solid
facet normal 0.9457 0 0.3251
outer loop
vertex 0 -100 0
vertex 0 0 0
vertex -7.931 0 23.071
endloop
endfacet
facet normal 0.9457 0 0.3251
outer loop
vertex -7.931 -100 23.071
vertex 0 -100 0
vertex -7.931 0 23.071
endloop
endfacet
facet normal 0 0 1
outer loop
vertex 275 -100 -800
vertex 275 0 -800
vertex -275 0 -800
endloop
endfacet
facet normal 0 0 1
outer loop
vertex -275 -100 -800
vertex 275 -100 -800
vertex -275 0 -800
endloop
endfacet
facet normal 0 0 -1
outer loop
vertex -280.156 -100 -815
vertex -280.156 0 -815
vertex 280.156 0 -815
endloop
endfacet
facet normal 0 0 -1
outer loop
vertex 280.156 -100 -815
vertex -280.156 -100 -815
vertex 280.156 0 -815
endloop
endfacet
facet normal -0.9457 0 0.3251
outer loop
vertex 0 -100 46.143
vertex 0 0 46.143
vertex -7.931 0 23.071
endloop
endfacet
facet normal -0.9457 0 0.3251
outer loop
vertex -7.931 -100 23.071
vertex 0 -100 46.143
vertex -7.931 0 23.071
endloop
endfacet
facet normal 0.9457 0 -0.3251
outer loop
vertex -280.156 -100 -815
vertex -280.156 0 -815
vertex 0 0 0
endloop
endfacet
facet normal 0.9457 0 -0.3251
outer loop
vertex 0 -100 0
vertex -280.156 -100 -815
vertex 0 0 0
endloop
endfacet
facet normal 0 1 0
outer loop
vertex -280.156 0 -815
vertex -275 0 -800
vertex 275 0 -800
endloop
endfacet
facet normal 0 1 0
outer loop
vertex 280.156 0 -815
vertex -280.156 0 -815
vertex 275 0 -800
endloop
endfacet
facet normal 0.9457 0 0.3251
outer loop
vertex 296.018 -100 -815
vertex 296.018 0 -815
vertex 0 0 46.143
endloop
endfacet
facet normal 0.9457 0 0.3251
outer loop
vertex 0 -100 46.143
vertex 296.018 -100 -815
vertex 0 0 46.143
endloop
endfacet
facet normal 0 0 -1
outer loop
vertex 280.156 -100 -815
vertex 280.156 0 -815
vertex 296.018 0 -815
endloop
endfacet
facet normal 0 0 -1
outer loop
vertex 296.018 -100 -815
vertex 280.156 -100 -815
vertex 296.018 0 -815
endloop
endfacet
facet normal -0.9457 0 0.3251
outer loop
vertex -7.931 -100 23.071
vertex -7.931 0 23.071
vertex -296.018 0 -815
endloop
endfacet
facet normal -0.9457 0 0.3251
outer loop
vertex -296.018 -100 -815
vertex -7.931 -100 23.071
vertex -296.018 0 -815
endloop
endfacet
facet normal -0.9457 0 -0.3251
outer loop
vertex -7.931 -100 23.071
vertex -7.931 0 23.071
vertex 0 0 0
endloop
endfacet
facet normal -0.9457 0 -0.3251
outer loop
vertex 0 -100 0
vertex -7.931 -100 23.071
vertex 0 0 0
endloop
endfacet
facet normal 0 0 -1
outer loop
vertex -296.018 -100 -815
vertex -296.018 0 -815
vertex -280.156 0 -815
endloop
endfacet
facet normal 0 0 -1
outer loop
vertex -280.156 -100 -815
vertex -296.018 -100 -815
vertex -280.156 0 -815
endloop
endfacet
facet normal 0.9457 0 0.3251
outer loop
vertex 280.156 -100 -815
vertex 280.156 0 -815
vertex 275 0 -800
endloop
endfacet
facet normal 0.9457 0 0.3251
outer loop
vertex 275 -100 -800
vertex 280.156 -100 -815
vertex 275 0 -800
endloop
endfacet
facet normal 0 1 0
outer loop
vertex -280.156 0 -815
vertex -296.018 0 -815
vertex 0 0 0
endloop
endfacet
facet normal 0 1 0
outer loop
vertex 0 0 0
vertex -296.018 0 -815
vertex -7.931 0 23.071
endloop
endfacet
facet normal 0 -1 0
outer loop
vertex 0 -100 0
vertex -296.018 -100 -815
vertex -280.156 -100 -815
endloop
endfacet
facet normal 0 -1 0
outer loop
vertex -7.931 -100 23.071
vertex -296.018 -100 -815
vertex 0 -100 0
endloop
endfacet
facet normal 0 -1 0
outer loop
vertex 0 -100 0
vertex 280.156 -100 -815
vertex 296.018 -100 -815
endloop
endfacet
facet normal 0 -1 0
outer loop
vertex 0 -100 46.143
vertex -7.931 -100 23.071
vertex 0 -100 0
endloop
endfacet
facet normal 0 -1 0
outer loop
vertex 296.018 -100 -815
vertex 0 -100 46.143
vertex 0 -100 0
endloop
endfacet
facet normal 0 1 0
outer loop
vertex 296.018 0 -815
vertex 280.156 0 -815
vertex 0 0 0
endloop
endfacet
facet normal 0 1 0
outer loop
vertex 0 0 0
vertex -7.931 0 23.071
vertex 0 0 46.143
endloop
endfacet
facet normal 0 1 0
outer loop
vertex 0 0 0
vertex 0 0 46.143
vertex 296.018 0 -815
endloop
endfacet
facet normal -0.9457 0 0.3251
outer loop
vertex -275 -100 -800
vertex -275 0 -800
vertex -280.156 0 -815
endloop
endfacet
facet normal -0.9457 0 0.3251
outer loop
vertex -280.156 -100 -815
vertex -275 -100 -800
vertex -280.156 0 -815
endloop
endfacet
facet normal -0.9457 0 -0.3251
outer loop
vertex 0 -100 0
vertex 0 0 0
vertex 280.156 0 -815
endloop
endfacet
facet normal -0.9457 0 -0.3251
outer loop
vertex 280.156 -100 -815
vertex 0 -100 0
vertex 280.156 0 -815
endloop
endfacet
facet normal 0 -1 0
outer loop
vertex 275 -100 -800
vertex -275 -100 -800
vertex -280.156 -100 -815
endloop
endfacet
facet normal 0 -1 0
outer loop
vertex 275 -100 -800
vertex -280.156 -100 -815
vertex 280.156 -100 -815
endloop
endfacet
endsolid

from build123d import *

# Parameters (mm, degrees)
F1_DEPTH = 100
F2_DEPTH = 100
F3_DEPTH = 100


with BuildPart() as f1:
    # F0 (on Front) → F1 (new body)
    with BuildSketch(Plane.XZ):
        Polygon((-280.15625, -815), (-275, -800), (0, 0), (-7.930746, 23.07126), (-296.017742, -815), align=None)
    extrude(amount=F1_DEPTH)


with BuildPart() as f2:
    # F0 (on Front) → F2 (new body)
    with BuildSketch(Plane.XZ):
        Polygon((0, 0), (275, -800), (280.15625, -815), (296.017742, -815), (0, 46.142521), (-7.930746, 23.07126), align=None)
    extrude(amount=F2_DEPTH)


with BuildPart() as f3:
    # F0 (on Front) → F3 (new body)
    with BuildSketch(Plane.XZ):
        Polygon((275, -800), (0, -800), (-275, -800), (-280.15625, -815), (0, -815), (280.15625, -815), align=None)
    extrude(amount=F3_DEPTH)


solid = Compound([f1.part, f2.part, f3.part])
